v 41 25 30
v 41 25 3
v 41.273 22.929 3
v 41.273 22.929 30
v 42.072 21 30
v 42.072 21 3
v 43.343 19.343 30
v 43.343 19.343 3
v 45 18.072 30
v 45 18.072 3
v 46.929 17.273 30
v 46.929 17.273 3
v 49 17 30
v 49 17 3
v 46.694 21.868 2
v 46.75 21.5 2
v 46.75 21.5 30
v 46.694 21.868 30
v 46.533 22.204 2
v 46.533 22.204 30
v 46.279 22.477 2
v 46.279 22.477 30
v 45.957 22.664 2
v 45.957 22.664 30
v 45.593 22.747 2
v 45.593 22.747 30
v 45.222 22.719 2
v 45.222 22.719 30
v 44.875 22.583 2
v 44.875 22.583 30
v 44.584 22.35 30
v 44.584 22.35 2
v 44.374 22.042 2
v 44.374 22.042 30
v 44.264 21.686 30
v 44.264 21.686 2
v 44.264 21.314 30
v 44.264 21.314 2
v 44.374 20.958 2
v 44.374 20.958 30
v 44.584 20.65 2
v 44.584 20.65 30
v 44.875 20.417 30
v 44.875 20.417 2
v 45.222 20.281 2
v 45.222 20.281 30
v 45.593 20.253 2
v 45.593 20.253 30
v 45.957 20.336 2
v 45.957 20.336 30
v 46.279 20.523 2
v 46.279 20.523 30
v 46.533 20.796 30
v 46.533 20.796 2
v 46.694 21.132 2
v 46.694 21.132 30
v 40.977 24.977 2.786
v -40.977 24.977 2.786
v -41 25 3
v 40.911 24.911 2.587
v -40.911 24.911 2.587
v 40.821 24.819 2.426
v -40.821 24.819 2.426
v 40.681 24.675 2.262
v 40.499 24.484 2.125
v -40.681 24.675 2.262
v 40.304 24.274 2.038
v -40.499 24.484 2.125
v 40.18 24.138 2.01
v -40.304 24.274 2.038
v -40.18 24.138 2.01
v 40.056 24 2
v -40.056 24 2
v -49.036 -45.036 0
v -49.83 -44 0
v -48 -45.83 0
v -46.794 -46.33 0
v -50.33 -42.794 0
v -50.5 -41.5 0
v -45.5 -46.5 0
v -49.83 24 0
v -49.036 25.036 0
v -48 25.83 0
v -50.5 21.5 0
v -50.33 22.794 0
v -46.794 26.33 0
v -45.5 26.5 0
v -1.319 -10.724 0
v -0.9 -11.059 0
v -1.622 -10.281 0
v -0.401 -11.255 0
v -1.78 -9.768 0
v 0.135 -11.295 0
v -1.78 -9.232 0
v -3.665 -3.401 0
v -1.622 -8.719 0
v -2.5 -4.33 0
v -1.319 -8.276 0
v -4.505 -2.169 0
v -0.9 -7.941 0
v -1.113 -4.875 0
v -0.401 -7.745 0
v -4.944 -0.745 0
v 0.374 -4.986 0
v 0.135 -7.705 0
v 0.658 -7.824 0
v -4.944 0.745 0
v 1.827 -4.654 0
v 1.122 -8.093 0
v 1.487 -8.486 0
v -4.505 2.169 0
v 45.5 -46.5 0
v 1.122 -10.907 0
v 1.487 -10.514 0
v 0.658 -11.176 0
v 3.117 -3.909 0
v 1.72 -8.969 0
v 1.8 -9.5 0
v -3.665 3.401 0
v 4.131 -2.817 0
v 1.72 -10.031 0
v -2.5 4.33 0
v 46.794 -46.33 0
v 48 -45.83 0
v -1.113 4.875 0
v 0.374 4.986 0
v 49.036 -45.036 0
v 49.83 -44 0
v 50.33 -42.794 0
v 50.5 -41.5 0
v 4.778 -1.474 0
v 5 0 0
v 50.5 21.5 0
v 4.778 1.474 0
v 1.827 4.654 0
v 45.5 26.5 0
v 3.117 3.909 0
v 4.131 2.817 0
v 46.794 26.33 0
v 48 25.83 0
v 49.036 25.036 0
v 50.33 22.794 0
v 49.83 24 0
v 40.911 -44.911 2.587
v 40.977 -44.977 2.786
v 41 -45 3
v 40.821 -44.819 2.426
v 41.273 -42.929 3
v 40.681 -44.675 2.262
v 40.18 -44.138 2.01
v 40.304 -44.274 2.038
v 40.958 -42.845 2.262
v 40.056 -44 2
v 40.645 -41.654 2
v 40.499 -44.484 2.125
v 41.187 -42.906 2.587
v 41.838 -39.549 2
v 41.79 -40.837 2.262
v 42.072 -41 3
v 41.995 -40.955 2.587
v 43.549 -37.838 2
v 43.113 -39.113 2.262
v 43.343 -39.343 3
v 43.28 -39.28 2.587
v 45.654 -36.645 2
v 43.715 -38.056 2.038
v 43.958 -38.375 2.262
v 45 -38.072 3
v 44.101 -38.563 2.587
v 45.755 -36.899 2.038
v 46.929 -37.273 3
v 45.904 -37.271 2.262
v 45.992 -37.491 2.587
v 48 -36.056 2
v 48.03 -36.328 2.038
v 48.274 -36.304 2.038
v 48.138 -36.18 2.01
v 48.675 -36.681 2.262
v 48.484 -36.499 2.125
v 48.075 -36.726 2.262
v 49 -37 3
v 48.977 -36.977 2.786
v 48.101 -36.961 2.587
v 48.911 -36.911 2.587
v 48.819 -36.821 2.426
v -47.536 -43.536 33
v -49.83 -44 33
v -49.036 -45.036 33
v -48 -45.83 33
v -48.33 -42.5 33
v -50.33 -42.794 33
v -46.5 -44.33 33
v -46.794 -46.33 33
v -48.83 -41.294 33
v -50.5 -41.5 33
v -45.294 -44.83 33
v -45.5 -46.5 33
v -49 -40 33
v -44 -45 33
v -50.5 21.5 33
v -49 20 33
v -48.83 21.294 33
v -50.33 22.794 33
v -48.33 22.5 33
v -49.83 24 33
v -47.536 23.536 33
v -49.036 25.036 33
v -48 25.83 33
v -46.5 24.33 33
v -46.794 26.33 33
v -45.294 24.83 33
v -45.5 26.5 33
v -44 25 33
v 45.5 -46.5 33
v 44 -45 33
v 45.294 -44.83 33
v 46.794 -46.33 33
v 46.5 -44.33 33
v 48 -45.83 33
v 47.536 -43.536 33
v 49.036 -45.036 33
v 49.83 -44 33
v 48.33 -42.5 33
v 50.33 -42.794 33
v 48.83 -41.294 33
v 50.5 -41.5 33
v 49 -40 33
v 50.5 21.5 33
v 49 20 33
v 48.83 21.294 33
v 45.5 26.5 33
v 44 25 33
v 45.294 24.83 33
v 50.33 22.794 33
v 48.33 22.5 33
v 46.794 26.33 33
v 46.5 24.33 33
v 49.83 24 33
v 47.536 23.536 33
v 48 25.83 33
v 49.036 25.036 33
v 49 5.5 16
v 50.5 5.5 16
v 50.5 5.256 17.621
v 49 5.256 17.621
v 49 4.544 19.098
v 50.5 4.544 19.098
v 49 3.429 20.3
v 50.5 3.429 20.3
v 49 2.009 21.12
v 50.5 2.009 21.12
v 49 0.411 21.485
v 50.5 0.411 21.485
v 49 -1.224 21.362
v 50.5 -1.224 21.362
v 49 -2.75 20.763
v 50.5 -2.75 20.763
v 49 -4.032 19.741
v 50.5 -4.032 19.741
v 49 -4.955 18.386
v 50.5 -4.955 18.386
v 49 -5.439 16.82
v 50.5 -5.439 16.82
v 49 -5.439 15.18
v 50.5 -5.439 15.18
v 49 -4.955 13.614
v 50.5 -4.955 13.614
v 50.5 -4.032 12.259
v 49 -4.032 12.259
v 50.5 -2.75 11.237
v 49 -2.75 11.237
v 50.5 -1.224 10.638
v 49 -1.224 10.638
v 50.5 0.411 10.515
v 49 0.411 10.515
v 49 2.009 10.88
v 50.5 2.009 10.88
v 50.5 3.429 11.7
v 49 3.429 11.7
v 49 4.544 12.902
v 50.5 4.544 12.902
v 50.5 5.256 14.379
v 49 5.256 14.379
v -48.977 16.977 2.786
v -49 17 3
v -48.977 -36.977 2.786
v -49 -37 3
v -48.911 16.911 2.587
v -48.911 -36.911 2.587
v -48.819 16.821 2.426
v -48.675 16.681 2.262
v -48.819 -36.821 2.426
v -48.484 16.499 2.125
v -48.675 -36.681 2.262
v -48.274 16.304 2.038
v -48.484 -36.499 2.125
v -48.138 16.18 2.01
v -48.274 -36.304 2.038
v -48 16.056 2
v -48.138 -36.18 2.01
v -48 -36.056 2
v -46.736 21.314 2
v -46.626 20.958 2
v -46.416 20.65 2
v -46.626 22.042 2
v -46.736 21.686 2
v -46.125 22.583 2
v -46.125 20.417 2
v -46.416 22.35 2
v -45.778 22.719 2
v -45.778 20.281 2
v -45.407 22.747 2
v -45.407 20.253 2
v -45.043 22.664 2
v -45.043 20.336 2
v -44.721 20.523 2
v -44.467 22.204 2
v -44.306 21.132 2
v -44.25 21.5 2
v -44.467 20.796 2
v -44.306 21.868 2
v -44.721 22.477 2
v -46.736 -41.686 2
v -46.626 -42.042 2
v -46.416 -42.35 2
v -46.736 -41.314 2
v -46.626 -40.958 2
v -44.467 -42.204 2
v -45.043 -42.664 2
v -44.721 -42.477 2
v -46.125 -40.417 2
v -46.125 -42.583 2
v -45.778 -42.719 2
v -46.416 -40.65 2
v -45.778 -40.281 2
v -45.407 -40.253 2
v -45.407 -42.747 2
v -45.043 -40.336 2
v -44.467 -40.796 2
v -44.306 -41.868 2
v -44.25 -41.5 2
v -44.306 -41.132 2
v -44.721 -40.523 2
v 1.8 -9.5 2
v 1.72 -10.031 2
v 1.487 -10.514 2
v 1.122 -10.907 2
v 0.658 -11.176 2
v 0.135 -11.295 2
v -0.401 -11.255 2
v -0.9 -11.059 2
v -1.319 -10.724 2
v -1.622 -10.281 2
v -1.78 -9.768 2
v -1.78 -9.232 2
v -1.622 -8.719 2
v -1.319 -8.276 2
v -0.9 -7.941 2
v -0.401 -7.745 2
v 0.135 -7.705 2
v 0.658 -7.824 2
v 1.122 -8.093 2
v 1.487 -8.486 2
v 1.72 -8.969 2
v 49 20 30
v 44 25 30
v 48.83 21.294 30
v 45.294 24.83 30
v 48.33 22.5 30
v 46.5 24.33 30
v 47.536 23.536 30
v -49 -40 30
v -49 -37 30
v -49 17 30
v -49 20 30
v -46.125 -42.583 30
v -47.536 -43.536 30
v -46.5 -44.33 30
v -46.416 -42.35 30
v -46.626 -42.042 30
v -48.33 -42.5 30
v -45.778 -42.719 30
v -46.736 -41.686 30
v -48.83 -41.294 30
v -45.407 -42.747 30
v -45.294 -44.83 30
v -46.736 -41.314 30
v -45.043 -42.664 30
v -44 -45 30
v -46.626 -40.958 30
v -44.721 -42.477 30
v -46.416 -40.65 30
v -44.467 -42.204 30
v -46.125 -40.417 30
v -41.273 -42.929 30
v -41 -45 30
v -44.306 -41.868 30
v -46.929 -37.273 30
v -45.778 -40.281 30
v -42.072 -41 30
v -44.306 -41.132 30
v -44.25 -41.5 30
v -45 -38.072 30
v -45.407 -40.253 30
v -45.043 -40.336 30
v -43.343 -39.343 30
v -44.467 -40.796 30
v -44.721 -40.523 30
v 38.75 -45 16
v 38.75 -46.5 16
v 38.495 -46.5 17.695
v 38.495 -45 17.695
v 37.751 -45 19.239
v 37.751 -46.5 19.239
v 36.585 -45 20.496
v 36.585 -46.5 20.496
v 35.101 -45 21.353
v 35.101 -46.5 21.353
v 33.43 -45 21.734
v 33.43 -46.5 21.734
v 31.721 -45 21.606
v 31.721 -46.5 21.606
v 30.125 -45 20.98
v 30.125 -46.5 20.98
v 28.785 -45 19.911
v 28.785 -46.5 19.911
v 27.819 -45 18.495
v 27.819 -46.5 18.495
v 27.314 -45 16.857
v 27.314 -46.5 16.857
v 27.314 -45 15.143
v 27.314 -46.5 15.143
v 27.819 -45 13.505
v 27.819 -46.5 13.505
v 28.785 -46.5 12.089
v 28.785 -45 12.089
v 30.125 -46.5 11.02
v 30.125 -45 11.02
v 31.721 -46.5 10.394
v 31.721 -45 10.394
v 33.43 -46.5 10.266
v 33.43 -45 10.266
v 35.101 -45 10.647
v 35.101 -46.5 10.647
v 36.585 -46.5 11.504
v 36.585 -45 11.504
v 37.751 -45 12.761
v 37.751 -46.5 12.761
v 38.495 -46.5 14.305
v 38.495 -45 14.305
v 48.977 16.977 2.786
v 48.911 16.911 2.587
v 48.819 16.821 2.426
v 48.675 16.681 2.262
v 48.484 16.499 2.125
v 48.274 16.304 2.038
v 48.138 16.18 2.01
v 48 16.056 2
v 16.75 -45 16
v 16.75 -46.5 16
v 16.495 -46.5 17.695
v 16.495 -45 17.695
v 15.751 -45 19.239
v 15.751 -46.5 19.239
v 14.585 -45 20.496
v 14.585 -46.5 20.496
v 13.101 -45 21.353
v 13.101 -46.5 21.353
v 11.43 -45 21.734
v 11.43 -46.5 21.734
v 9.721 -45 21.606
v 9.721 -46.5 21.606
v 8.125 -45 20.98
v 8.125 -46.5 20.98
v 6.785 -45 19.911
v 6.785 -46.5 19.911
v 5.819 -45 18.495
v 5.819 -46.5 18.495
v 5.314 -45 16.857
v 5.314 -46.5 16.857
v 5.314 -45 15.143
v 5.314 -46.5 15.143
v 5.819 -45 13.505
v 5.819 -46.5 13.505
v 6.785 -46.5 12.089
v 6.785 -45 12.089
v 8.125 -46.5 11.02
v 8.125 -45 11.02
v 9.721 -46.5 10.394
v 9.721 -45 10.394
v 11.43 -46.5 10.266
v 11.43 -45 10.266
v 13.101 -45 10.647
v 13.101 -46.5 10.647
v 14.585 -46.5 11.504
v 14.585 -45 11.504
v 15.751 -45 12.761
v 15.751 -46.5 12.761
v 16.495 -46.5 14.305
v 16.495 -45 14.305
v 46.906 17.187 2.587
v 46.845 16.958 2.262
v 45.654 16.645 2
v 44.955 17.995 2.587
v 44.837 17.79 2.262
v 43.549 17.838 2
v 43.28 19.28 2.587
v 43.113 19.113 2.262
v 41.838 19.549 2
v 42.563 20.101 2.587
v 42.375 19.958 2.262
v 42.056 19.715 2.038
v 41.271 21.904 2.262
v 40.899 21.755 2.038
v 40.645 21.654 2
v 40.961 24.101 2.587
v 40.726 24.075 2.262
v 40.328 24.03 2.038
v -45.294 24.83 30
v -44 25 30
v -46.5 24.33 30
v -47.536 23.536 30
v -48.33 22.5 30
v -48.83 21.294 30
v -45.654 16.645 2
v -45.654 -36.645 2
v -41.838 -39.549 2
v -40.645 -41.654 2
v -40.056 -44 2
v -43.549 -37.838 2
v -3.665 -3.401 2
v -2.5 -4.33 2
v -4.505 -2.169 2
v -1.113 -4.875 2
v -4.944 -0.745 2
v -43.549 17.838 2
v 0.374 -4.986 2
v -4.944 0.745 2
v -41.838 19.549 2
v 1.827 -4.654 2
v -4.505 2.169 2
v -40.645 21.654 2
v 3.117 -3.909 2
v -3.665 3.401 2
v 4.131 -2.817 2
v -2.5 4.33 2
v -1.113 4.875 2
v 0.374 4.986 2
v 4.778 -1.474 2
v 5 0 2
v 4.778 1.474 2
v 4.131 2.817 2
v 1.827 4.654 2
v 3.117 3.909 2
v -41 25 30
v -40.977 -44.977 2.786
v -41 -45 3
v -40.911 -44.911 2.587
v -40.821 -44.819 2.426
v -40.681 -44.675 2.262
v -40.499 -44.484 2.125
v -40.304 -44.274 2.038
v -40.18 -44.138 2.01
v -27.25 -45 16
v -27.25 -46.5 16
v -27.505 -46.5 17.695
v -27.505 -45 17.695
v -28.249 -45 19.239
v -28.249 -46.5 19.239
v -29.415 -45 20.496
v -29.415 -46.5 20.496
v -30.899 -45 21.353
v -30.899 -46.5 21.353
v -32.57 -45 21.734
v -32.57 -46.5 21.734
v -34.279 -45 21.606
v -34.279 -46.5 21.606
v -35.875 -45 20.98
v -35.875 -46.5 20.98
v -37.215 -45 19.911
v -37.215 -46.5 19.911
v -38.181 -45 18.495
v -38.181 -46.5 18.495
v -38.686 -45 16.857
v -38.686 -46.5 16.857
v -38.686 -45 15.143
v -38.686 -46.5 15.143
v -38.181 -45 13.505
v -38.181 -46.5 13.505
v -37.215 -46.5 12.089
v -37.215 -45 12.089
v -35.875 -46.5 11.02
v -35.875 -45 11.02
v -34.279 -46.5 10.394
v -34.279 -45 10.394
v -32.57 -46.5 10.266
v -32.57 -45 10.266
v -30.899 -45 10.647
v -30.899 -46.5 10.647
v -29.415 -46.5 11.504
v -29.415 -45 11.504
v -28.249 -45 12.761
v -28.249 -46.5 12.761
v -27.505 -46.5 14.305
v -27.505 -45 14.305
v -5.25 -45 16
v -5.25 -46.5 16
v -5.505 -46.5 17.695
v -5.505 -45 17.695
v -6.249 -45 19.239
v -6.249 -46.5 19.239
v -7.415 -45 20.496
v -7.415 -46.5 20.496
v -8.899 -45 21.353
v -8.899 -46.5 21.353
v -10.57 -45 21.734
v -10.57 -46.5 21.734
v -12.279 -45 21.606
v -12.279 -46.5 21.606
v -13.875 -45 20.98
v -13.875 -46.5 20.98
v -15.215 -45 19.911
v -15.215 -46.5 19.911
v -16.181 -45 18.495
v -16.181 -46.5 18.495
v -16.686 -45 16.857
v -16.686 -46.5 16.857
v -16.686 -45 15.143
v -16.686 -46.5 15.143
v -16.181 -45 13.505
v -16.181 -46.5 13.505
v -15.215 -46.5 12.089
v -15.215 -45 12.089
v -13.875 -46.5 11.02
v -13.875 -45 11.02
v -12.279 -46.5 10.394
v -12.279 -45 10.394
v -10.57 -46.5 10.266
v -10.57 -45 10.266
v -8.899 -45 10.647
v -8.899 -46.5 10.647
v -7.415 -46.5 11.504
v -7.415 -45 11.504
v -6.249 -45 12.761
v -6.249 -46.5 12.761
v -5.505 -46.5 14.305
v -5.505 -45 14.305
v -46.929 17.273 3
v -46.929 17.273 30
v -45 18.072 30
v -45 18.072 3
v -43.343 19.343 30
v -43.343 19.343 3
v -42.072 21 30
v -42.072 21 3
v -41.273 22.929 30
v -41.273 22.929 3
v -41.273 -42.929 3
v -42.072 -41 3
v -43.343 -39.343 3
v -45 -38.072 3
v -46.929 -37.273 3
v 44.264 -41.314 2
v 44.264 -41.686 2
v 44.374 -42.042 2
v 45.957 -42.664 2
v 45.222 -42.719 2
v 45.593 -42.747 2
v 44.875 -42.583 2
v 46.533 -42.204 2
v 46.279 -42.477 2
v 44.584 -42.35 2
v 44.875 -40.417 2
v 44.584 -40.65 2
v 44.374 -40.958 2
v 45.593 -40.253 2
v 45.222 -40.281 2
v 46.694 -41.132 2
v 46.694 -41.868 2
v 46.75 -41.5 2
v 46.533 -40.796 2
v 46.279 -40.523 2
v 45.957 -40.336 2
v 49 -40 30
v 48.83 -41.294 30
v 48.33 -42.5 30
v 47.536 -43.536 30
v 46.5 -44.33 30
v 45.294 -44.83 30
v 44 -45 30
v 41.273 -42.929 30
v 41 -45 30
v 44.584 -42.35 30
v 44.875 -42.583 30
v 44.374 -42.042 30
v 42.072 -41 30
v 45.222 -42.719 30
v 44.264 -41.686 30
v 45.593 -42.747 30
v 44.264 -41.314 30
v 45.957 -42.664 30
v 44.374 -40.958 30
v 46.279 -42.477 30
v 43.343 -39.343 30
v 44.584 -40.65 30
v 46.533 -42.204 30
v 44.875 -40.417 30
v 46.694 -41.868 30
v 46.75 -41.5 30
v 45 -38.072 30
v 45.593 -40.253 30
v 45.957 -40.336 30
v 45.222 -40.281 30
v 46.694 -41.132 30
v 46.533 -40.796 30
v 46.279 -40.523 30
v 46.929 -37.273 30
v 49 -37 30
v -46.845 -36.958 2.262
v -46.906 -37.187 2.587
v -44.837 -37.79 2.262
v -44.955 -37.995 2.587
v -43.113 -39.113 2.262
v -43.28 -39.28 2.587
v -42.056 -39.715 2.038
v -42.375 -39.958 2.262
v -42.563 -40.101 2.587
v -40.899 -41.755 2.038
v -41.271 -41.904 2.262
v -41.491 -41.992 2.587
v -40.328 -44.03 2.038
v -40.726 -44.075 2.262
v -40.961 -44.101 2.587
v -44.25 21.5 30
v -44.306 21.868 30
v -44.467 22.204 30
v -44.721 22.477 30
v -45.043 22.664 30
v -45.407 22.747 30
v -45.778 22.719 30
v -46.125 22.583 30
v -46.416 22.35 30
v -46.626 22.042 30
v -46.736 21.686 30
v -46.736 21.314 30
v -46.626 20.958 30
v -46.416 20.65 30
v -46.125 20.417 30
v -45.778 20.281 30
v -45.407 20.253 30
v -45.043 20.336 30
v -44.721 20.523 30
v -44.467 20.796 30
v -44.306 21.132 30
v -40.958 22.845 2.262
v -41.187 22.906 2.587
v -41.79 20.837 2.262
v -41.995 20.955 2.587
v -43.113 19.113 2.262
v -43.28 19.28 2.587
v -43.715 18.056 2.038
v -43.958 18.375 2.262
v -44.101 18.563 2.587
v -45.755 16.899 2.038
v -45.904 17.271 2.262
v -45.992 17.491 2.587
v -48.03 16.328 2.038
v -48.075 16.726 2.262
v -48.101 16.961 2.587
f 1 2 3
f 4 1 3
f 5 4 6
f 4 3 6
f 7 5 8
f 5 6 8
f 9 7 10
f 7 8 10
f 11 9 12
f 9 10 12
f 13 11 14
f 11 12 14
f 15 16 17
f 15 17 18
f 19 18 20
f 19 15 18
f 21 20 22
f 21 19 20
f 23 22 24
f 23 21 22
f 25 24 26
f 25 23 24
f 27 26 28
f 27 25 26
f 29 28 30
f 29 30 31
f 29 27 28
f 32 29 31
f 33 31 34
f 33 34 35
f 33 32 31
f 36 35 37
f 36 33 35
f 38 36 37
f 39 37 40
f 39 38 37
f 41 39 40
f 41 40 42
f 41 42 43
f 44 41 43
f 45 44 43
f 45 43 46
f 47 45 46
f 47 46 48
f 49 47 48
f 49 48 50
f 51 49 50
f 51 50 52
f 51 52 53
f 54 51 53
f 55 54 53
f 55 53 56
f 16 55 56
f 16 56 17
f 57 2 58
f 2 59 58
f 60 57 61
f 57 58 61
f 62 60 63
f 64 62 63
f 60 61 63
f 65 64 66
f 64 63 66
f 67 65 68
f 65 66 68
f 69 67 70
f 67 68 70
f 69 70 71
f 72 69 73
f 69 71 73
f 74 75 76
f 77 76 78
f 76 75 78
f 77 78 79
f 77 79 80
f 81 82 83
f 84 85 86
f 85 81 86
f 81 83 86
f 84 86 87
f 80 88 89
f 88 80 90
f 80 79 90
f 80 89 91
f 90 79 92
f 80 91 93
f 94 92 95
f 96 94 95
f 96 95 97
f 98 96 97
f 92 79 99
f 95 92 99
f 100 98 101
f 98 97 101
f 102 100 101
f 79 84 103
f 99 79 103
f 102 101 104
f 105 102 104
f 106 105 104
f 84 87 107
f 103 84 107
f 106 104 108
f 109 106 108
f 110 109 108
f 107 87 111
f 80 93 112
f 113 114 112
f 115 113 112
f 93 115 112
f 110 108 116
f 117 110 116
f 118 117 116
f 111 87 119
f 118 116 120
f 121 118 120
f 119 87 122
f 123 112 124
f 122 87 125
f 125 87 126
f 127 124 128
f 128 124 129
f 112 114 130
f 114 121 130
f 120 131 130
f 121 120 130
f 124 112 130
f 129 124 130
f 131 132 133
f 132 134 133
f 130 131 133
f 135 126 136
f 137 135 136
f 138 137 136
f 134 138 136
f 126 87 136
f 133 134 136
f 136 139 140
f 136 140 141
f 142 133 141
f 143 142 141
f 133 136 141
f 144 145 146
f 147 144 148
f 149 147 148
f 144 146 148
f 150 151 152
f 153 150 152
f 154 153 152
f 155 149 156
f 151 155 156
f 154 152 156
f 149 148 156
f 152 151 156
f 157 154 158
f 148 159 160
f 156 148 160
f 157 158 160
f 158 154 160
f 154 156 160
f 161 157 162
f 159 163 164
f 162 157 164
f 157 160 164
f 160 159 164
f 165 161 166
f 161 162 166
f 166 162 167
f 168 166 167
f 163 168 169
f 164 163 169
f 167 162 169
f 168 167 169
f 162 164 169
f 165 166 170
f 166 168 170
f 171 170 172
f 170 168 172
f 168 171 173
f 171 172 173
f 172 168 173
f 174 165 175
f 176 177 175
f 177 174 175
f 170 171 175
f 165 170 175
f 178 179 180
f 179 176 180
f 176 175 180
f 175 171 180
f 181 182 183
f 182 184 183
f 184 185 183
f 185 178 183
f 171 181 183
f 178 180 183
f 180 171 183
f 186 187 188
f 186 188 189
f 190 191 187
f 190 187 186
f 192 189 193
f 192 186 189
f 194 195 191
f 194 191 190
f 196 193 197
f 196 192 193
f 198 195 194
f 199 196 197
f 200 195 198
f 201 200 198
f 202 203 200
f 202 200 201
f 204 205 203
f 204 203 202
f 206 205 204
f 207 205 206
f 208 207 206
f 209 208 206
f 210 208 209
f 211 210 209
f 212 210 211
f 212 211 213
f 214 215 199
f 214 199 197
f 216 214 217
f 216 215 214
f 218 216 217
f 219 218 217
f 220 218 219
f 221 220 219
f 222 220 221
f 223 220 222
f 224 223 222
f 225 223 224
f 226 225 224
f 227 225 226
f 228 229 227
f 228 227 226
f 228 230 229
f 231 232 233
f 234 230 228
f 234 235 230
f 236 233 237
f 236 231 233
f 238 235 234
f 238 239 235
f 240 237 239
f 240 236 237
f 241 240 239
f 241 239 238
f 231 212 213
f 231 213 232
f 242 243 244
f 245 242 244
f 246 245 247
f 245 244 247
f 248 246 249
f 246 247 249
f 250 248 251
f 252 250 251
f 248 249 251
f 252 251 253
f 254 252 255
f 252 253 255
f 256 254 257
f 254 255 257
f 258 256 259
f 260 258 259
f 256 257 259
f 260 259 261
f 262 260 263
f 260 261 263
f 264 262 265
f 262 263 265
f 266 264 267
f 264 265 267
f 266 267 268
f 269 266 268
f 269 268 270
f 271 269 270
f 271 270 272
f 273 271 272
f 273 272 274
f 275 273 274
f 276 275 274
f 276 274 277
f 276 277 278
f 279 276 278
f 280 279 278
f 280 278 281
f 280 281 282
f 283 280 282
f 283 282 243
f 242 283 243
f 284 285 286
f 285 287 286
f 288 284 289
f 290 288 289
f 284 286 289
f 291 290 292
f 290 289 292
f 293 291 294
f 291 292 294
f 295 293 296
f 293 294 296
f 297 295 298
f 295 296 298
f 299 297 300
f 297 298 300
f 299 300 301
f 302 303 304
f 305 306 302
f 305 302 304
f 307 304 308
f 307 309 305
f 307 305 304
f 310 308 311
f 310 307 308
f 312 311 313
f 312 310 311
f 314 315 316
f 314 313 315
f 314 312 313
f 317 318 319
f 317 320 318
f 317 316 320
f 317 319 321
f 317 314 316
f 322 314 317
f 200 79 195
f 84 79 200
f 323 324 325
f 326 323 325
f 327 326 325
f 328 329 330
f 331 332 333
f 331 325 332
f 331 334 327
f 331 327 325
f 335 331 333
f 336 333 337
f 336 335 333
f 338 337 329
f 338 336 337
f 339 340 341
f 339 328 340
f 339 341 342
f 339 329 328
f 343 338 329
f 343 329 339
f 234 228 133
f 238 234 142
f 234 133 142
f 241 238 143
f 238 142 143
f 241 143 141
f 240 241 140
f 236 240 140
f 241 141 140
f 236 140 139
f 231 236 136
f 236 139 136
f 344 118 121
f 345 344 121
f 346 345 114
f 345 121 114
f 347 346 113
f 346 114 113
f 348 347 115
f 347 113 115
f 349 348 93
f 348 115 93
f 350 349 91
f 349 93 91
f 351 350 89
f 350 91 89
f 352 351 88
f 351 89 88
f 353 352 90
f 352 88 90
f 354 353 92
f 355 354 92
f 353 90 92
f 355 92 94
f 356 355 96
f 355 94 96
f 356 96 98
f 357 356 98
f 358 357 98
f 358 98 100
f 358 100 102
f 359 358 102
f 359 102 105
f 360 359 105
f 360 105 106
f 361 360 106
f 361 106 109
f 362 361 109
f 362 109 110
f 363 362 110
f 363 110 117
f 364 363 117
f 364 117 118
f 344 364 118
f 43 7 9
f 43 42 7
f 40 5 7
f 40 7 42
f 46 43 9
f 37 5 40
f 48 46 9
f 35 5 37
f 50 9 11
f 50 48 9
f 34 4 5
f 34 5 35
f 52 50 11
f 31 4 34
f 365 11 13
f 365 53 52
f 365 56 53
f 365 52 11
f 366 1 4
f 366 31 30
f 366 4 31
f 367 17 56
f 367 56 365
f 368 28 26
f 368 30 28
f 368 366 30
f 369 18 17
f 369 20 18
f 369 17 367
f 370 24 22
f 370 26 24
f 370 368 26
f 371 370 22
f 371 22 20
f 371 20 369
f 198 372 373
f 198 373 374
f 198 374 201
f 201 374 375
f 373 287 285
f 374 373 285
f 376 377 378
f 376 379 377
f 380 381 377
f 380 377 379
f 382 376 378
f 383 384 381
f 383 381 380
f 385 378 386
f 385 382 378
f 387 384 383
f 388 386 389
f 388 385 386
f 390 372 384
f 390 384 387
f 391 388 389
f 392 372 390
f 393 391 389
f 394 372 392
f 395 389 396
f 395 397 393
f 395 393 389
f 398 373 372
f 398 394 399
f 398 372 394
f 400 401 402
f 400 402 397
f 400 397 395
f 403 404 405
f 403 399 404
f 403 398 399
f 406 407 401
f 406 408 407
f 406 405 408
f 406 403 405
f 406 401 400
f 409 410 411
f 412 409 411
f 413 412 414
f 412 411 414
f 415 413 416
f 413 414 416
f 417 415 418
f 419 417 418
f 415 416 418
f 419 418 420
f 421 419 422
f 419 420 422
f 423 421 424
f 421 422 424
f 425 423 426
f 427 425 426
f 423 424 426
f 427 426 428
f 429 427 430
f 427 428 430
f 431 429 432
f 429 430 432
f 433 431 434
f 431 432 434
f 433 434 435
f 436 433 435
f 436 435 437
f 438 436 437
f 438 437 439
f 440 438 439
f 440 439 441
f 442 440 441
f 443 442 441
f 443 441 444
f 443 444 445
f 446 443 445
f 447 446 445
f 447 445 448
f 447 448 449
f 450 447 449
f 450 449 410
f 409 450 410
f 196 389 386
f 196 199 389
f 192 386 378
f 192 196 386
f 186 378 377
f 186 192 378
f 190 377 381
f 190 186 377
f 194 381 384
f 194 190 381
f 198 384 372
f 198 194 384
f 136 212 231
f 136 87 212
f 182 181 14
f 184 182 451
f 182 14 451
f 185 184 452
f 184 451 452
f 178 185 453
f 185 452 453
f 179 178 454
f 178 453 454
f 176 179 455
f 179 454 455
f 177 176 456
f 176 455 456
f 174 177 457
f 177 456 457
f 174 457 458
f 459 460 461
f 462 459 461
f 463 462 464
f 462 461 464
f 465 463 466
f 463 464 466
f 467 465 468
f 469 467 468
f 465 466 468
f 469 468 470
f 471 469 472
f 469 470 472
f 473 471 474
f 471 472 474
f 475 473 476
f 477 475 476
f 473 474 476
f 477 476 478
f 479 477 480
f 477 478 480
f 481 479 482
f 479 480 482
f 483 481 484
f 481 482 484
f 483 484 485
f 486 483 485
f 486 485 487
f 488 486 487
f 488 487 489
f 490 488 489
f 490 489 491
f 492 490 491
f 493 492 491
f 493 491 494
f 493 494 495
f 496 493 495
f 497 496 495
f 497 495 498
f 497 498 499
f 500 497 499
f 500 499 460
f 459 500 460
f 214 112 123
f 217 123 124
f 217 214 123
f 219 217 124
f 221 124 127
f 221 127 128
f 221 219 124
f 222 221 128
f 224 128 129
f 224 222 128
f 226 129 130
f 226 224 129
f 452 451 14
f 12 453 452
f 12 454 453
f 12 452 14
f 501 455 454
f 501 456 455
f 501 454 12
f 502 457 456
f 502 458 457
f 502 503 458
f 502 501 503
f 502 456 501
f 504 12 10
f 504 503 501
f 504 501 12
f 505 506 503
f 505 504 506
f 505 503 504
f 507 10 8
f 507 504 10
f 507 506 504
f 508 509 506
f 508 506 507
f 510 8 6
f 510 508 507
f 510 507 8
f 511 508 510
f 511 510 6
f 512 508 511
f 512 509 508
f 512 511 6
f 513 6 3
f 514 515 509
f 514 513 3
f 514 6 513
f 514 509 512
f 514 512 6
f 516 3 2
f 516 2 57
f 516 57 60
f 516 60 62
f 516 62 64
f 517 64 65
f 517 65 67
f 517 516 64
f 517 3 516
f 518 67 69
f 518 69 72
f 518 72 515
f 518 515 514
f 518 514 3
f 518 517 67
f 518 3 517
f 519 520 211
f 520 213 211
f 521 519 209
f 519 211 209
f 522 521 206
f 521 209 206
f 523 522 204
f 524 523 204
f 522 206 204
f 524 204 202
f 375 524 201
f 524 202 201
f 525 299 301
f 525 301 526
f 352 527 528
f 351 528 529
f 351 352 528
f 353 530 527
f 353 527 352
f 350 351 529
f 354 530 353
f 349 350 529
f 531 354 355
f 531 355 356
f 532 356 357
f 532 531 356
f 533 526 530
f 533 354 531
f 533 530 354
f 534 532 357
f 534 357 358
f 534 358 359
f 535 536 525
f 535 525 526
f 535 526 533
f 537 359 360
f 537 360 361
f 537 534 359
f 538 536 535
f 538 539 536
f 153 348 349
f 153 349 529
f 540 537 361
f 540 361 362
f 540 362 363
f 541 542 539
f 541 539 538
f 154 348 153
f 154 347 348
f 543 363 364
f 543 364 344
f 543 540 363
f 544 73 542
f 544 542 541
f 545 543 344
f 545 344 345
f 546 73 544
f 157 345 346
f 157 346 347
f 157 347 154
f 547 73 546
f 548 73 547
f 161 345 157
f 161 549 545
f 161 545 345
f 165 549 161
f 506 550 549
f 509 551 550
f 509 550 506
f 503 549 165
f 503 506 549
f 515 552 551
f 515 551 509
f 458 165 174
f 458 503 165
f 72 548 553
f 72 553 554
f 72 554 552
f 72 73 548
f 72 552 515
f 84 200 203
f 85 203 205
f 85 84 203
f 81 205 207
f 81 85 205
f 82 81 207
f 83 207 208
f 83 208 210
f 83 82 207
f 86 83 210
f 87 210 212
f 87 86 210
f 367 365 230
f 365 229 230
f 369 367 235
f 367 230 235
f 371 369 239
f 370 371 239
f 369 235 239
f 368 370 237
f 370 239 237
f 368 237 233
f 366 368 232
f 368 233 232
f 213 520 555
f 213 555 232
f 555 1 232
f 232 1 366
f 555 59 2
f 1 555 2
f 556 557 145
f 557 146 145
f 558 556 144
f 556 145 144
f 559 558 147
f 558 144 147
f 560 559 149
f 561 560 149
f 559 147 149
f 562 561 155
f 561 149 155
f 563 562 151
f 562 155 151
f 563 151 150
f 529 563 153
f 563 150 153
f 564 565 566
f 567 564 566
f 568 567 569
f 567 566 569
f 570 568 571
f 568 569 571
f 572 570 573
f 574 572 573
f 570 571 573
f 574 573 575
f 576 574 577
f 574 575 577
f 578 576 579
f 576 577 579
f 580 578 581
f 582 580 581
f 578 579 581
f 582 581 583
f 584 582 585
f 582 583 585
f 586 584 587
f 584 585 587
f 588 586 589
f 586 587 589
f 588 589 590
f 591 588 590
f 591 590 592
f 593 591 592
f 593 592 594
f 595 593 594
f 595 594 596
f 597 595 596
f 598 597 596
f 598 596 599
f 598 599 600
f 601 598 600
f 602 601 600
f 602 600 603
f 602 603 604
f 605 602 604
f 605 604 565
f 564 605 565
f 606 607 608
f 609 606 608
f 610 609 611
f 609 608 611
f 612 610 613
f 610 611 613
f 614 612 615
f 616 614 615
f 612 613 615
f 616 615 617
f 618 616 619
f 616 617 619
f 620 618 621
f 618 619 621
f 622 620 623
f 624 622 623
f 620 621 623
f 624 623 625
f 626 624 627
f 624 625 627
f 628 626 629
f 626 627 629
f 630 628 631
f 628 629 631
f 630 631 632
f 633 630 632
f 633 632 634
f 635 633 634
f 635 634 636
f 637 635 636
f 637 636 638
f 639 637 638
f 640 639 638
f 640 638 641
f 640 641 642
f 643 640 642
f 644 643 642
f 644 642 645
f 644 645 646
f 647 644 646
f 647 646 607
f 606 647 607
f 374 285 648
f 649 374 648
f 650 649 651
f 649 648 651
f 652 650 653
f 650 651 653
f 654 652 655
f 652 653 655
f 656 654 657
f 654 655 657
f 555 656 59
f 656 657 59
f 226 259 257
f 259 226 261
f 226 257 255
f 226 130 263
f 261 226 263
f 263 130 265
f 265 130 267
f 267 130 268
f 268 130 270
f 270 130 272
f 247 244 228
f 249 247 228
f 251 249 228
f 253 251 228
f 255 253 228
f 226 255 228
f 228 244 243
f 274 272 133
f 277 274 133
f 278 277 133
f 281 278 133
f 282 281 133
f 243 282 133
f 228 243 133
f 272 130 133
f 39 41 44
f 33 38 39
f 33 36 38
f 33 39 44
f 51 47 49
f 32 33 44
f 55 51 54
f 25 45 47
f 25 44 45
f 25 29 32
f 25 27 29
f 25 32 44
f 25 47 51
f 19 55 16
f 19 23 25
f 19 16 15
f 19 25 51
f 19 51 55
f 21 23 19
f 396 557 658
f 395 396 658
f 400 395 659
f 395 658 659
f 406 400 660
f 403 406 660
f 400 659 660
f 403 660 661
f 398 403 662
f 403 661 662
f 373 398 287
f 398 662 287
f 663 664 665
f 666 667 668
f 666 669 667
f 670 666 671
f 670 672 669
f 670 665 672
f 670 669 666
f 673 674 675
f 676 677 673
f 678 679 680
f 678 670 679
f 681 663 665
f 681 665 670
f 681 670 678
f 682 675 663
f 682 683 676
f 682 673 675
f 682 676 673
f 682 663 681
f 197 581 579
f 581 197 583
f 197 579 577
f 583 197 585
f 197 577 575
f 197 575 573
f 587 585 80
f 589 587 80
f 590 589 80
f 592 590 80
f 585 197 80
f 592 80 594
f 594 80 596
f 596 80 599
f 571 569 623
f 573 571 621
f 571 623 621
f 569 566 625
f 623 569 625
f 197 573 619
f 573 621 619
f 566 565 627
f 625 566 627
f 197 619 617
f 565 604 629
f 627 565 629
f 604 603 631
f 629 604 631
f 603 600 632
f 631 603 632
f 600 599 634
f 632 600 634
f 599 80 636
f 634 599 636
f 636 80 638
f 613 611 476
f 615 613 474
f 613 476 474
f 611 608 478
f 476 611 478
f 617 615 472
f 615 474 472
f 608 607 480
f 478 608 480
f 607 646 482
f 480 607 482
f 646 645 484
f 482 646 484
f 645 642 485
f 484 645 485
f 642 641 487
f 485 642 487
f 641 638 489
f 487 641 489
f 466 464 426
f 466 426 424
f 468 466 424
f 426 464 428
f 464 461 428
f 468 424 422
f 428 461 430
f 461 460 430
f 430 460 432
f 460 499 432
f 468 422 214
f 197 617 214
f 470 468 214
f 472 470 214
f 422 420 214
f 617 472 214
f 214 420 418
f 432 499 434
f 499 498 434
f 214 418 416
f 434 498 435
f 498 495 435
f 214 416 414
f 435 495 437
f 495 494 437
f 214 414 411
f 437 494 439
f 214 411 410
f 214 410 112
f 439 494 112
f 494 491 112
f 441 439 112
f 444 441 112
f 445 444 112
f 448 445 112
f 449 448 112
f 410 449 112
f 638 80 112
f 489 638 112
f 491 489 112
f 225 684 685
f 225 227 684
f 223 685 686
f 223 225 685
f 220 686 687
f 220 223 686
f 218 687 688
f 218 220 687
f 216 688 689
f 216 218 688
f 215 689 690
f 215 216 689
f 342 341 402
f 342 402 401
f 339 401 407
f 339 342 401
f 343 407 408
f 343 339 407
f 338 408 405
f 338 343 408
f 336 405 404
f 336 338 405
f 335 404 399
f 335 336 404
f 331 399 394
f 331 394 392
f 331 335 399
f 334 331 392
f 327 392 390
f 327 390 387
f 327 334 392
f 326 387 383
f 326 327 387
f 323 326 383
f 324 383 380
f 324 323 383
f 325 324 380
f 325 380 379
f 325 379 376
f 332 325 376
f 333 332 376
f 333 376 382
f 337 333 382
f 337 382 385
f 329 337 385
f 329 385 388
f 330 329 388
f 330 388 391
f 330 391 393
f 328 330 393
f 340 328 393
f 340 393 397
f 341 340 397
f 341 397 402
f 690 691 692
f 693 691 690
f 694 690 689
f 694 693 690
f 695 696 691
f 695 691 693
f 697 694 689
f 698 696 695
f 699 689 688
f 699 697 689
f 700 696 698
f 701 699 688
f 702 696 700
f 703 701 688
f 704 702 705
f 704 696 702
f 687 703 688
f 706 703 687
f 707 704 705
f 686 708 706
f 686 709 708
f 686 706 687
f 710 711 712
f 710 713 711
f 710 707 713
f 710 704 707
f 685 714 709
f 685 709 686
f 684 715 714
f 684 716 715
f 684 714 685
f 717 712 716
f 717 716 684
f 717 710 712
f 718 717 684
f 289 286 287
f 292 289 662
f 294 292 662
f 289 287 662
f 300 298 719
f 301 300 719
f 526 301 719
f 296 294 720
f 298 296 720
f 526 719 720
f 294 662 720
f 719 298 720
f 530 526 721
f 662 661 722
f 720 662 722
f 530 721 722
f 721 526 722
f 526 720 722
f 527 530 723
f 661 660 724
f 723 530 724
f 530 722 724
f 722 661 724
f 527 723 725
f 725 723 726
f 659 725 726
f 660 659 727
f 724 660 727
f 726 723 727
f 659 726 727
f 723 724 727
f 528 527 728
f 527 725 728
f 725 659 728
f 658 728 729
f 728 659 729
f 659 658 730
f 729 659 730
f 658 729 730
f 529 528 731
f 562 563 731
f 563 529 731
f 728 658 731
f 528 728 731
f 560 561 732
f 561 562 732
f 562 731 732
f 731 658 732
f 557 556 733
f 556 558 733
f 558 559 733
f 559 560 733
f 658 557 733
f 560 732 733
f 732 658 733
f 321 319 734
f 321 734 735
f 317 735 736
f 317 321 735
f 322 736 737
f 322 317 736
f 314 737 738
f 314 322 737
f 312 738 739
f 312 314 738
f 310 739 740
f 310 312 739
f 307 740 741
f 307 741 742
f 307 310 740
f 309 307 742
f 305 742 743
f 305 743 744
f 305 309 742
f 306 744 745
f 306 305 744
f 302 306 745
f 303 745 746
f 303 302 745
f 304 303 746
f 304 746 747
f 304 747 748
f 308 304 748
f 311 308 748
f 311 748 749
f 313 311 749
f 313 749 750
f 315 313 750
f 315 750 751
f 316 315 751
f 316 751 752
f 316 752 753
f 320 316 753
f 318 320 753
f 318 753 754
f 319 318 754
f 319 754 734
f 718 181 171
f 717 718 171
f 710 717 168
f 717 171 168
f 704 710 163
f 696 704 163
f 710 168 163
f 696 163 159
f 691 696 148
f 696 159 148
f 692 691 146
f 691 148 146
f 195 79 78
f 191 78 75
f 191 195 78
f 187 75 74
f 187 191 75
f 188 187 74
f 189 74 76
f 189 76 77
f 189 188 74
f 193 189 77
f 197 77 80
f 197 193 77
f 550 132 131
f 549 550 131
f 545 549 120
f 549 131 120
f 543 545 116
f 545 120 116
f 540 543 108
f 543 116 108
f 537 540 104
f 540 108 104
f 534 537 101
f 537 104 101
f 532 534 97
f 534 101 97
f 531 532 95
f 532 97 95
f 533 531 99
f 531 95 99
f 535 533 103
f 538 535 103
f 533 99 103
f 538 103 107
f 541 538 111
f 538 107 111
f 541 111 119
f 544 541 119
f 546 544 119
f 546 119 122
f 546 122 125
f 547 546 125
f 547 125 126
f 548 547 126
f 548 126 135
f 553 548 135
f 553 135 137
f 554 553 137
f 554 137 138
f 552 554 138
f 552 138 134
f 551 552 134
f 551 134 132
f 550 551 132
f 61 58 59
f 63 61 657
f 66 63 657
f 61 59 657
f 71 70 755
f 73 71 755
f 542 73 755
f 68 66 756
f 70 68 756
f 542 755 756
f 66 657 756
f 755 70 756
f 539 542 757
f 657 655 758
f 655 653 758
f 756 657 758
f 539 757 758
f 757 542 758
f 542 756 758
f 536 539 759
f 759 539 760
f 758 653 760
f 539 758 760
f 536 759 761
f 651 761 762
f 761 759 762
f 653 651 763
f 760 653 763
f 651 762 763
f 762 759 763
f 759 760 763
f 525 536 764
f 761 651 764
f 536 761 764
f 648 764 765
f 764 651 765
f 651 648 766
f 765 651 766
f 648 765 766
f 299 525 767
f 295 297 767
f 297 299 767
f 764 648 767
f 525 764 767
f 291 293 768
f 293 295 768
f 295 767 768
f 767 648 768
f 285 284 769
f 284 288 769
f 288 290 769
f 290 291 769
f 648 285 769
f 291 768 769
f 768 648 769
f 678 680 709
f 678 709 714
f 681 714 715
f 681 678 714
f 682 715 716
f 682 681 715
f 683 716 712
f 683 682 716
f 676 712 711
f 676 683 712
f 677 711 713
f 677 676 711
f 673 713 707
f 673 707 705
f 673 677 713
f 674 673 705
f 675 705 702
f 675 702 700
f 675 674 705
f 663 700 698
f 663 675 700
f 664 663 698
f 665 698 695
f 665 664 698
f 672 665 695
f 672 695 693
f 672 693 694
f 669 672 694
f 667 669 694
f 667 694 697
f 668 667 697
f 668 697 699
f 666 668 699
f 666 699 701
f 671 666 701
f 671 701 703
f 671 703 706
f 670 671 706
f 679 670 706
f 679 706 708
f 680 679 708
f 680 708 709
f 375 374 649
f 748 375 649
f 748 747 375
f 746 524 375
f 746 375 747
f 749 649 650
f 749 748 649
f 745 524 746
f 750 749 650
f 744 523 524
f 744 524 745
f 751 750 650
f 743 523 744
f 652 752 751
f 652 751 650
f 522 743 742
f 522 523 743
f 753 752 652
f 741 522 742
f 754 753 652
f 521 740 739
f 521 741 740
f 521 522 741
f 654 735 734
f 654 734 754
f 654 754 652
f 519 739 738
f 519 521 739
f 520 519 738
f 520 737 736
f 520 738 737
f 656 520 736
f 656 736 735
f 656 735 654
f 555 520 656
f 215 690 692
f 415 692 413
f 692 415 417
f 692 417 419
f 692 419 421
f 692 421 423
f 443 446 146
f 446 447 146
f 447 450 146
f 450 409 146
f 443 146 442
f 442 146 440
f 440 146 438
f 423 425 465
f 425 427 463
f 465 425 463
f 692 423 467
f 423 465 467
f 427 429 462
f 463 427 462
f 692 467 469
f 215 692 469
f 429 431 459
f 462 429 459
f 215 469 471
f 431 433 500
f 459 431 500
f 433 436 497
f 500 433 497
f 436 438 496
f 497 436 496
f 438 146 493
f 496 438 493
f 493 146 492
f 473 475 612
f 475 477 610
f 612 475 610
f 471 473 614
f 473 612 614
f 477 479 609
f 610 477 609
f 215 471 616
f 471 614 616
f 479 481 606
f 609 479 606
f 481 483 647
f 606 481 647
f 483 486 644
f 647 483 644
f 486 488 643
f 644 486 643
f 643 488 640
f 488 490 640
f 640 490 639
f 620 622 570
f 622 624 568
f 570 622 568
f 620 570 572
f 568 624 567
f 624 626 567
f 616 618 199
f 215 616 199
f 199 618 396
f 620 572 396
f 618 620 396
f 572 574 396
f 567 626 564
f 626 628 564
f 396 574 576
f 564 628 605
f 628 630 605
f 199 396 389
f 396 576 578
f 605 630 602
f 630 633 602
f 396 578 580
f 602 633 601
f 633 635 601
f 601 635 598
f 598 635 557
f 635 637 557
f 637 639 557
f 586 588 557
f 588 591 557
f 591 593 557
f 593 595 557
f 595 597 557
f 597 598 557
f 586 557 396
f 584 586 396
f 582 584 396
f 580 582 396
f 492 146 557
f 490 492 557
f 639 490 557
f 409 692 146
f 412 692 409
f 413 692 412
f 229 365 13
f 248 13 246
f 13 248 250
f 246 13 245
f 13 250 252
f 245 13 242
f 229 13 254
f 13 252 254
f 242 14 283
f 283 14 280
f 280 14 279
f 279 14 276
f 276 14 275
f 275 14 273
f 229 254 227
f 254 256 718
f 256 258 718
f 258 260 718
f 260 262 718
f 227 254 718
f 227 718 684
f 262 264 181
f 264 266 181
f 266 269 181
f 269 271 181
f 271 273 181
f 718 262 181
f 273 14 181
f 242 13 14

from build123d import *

# Parameters (mm, degrees)
F0_R      = 1.25
F1_DEPTH  = 2
F0_W      = 101
F0_H      = 73
F2_DEPTH  = 30
F3_DEPTH  = 33
F4_R      = 5.5
F5_DEPTH  = 2
F6_R      = 5.75
F7_DEPTH  = 2
F8_R      = 1
F9_R      = 5
F10_R     = 5
F10_R_2   = 1.8
F11_DEPTH = 5


# Not quite as in the source:
# - a feature names something its author has since deleted; it is built from what else it names


with BuildPart() as f1:
    # F0 (on Top) → F1 (new body)
    with BuildSketch(Plane.XY):
        with BuildLine():
            Line((41, -45), (49, -45))
            Line((49, -45), (49, -37))
            ThreePointArc((49, -37), (43.3431457505, -39.3431457505), (41, -45))
        make_face()
        with Locations((45.5, -41.5)):
            Circle(F0_R, mode=Mode.SUBTRACT)
        with BuildLine():
            Line((-41, -45), (41, -45))
            ThreePointArc((41, -45), (43.3431457505, -39.3431457505), (49, -37))
            Line((49, -37), (49, 17))
            ThreePointArc((49, 17), (43.3431457505, 19.3431457505), (41, 25))
            Line((41, 25), (-41, 25))
            ThreePointArc((-41, 25), (-43.3431457505, 19.3431457505), (-49, 17))
            Line((-49, 17), (-49, -37))
            ThreePointArc((-49, -37), (-43.3431457505, -39.3431457505), (-41, -45))
        make_face()
        with BuildLine():
            Line((-49, -45), (-41, -45))
            ThreePointArc((-41, -45), (-43.3431457505, -39.3431457505), (-49, -37))
            Line((-49, -37), (-49, -45))
        make_face()
        with Locations((-45.5, -41.5)):
            Circle(F0_R, mode=Mode.SUBTRACT)
        with BuildLine():
            Line((-49, 25), (-49, 17))
            ThreePointArc((-49, 17), (-43.3431457505, 19.3431457505), (-41, 25))
            Line((-41, 25), (-49, 25))
        make_face()
        with Locations((-45.5, 21.5)):
            Circle(F0_R, mode=Mode.SUBTRACT)
        with Locations((-45.5, 21.5)):
            Circle(F0_R)
        with BuildLine():
            ThreePointArc((41, 25), (43.3431457505, 19.3431457505), (49, 17))
            Line((49, 17), (49, 25))
            Line((49, 25), (41, 25))
        make_face()
        with Locations((45.5, 21.5)):
            Circle(F0_R, mode=Mode.SUBTRACT)
        with Locations((45.5, 21.5)):
            Circle(F0_R)
        with Locations((45.5, -41.5)):
            Circle(F0_R)
        with Locations((-45.5, -41.5)):
            Circle(F0_R)
    extrude(amount=F1_DEPTH)

    # F0 (on Top) → F2 (join)
    with BuildSketch(Plane.XY):
        with Locations((0, -10)):
            Rectangle(F0_W, F0_H)
        Polygon((49, -37), (49, -45), (41, -45), (-41, -45), (-49, -45), (-49, -37), (-49, 17), (-49, 25), (-41, 25), (41, 25), (49, 25), (49, 17), align=None, mode=Mode.SUBTRACT)
        with BuildLine():
            Line((-49, -45), (-41, -45))
            ThreePointArc((-41, -45), (-43.3431457505, -39.3431457505), (-49, -37))
            Line((-49, -37), (-49, -45))
        make_face()
        with Locations((-45.5, -41.5)):
            Circle(F0_R, mode=Mode.SUBTRACT)
        with BuildLine():
            Line((41, -45), (49, -45))
            Line((49, -45), (49, -37))
            ThreePointArc((49, -37), (43.3431457505, -39.3431457505), (41, -45))
        make_face()
        with Locations((45.5, -41.5)):
            Circle(F0_R, mode=Mode.SUBTRACT)
        with BuildLine():
            ThreePointArc((41, 25), (43.3431457505, 19.3431457505), (49, 17))
            Line((49, 17), (49, 25))
            Line((49, 25), (41, 25))
        make_face()
        with Locations((45.5, 21.5)):
            Circle(F0_R, mode=Mode.SUBTRACT)
        with BuildLine():
            Line((-49, 25), (-49, 17))
            ThreePointArc((-49, 17), (-43.3431457505, 19.3431457505), (-41, 25))
            Line((-41, 25), (-49, 25))
        make_face()
        with Locations((-45.5, 21.5)):
            Circle(F0_R, mode=Mode.SUBTRACT)
    extrude(amount=F2_DEPTH)

    # F0 (on Top) → F3 (join)
    with BuildSketch(Plane.XY):
        with Locations((0, -10)):
            Rectangle(F0_W, F0_H)
        Polygon((49, -37), (49, -45), (41, -45), (-41, -45), (-49, -45), (-49, -37), (-49, 17), (-49, 25), (-41, 25), (41, 25), (49, 25), (49, 17), align=None, mode=Mode.SUBTRACT)
    extrude(amount=F3_DEPTH)

    # F4 (on face) → F5 (cut)
    with BuildSketch(Plane.YZ.offset(50.5)):
        with Locations((0, 16)):
            Circle(F4_R)
    extrude(amount=-F5_DEPTH, mode=Mode.SUBTRACT)

    # F6 (on face) → F7 (cut)
    with BuildSketch(Plane.XZ.offset(46.5)):
        with Locations((-33, 16)):
            Circle(F6_R)
        with Locations((-11, 16)):
            Circle(F6_R)
        with Locations((11, 16)):
            Circle(F6_R)
        with Locations((33, 16)):
            Circle(F6_R)
    extrude(amount=-F7_DEPTH, mode=Mode.SUBTRACT)

    # F8
    f8_edges = [f1.edges().sort_by_distance(p)[0] for p in [
        (0, -45, 2),
        (-49, -10, 2),
        (0, 25, 2),
        (49, -10, 2),
        (43.343146, -39.343146, 2),
        (43.343146, 19.343146, 2),
        (-43.343146, 19.343146, 2),
        (-43.343146, -39.343146, 2),
    ]]
    fillet(f8_edges, radius=F8_R)

    # F9
    f9_edges = [f1.edges().sort_by_distance(p)[0] for p in [
        (-50.5, 26.5, 16.5),
        (50.5, 26.5, 16.5),
        (50.5, -46.5, 16.5),
        (-50.5, -46.5, 16.5),
        (49, -45, 31.5),
        (49, 25, 31.5),
        (-49, 25, 31.5),
        (-49, -45, 31.5),
    ]]
    fillet(f9_edges, radius=F9_R)

    # F10 (on face) → F11 (cut)
    with BuildSketch(Plane(origin=(0, 0, 0), x_dir=(1, 0, 0), z_dir=(0, 0, -1))):
        Circle(F10_R)
        with Locations((0, 9.5)):
            Circle(F10_R_2)
    extrude(amount=-F11_DEPTH, mode=Mode.SUBTRACT)


solid = f1.part
